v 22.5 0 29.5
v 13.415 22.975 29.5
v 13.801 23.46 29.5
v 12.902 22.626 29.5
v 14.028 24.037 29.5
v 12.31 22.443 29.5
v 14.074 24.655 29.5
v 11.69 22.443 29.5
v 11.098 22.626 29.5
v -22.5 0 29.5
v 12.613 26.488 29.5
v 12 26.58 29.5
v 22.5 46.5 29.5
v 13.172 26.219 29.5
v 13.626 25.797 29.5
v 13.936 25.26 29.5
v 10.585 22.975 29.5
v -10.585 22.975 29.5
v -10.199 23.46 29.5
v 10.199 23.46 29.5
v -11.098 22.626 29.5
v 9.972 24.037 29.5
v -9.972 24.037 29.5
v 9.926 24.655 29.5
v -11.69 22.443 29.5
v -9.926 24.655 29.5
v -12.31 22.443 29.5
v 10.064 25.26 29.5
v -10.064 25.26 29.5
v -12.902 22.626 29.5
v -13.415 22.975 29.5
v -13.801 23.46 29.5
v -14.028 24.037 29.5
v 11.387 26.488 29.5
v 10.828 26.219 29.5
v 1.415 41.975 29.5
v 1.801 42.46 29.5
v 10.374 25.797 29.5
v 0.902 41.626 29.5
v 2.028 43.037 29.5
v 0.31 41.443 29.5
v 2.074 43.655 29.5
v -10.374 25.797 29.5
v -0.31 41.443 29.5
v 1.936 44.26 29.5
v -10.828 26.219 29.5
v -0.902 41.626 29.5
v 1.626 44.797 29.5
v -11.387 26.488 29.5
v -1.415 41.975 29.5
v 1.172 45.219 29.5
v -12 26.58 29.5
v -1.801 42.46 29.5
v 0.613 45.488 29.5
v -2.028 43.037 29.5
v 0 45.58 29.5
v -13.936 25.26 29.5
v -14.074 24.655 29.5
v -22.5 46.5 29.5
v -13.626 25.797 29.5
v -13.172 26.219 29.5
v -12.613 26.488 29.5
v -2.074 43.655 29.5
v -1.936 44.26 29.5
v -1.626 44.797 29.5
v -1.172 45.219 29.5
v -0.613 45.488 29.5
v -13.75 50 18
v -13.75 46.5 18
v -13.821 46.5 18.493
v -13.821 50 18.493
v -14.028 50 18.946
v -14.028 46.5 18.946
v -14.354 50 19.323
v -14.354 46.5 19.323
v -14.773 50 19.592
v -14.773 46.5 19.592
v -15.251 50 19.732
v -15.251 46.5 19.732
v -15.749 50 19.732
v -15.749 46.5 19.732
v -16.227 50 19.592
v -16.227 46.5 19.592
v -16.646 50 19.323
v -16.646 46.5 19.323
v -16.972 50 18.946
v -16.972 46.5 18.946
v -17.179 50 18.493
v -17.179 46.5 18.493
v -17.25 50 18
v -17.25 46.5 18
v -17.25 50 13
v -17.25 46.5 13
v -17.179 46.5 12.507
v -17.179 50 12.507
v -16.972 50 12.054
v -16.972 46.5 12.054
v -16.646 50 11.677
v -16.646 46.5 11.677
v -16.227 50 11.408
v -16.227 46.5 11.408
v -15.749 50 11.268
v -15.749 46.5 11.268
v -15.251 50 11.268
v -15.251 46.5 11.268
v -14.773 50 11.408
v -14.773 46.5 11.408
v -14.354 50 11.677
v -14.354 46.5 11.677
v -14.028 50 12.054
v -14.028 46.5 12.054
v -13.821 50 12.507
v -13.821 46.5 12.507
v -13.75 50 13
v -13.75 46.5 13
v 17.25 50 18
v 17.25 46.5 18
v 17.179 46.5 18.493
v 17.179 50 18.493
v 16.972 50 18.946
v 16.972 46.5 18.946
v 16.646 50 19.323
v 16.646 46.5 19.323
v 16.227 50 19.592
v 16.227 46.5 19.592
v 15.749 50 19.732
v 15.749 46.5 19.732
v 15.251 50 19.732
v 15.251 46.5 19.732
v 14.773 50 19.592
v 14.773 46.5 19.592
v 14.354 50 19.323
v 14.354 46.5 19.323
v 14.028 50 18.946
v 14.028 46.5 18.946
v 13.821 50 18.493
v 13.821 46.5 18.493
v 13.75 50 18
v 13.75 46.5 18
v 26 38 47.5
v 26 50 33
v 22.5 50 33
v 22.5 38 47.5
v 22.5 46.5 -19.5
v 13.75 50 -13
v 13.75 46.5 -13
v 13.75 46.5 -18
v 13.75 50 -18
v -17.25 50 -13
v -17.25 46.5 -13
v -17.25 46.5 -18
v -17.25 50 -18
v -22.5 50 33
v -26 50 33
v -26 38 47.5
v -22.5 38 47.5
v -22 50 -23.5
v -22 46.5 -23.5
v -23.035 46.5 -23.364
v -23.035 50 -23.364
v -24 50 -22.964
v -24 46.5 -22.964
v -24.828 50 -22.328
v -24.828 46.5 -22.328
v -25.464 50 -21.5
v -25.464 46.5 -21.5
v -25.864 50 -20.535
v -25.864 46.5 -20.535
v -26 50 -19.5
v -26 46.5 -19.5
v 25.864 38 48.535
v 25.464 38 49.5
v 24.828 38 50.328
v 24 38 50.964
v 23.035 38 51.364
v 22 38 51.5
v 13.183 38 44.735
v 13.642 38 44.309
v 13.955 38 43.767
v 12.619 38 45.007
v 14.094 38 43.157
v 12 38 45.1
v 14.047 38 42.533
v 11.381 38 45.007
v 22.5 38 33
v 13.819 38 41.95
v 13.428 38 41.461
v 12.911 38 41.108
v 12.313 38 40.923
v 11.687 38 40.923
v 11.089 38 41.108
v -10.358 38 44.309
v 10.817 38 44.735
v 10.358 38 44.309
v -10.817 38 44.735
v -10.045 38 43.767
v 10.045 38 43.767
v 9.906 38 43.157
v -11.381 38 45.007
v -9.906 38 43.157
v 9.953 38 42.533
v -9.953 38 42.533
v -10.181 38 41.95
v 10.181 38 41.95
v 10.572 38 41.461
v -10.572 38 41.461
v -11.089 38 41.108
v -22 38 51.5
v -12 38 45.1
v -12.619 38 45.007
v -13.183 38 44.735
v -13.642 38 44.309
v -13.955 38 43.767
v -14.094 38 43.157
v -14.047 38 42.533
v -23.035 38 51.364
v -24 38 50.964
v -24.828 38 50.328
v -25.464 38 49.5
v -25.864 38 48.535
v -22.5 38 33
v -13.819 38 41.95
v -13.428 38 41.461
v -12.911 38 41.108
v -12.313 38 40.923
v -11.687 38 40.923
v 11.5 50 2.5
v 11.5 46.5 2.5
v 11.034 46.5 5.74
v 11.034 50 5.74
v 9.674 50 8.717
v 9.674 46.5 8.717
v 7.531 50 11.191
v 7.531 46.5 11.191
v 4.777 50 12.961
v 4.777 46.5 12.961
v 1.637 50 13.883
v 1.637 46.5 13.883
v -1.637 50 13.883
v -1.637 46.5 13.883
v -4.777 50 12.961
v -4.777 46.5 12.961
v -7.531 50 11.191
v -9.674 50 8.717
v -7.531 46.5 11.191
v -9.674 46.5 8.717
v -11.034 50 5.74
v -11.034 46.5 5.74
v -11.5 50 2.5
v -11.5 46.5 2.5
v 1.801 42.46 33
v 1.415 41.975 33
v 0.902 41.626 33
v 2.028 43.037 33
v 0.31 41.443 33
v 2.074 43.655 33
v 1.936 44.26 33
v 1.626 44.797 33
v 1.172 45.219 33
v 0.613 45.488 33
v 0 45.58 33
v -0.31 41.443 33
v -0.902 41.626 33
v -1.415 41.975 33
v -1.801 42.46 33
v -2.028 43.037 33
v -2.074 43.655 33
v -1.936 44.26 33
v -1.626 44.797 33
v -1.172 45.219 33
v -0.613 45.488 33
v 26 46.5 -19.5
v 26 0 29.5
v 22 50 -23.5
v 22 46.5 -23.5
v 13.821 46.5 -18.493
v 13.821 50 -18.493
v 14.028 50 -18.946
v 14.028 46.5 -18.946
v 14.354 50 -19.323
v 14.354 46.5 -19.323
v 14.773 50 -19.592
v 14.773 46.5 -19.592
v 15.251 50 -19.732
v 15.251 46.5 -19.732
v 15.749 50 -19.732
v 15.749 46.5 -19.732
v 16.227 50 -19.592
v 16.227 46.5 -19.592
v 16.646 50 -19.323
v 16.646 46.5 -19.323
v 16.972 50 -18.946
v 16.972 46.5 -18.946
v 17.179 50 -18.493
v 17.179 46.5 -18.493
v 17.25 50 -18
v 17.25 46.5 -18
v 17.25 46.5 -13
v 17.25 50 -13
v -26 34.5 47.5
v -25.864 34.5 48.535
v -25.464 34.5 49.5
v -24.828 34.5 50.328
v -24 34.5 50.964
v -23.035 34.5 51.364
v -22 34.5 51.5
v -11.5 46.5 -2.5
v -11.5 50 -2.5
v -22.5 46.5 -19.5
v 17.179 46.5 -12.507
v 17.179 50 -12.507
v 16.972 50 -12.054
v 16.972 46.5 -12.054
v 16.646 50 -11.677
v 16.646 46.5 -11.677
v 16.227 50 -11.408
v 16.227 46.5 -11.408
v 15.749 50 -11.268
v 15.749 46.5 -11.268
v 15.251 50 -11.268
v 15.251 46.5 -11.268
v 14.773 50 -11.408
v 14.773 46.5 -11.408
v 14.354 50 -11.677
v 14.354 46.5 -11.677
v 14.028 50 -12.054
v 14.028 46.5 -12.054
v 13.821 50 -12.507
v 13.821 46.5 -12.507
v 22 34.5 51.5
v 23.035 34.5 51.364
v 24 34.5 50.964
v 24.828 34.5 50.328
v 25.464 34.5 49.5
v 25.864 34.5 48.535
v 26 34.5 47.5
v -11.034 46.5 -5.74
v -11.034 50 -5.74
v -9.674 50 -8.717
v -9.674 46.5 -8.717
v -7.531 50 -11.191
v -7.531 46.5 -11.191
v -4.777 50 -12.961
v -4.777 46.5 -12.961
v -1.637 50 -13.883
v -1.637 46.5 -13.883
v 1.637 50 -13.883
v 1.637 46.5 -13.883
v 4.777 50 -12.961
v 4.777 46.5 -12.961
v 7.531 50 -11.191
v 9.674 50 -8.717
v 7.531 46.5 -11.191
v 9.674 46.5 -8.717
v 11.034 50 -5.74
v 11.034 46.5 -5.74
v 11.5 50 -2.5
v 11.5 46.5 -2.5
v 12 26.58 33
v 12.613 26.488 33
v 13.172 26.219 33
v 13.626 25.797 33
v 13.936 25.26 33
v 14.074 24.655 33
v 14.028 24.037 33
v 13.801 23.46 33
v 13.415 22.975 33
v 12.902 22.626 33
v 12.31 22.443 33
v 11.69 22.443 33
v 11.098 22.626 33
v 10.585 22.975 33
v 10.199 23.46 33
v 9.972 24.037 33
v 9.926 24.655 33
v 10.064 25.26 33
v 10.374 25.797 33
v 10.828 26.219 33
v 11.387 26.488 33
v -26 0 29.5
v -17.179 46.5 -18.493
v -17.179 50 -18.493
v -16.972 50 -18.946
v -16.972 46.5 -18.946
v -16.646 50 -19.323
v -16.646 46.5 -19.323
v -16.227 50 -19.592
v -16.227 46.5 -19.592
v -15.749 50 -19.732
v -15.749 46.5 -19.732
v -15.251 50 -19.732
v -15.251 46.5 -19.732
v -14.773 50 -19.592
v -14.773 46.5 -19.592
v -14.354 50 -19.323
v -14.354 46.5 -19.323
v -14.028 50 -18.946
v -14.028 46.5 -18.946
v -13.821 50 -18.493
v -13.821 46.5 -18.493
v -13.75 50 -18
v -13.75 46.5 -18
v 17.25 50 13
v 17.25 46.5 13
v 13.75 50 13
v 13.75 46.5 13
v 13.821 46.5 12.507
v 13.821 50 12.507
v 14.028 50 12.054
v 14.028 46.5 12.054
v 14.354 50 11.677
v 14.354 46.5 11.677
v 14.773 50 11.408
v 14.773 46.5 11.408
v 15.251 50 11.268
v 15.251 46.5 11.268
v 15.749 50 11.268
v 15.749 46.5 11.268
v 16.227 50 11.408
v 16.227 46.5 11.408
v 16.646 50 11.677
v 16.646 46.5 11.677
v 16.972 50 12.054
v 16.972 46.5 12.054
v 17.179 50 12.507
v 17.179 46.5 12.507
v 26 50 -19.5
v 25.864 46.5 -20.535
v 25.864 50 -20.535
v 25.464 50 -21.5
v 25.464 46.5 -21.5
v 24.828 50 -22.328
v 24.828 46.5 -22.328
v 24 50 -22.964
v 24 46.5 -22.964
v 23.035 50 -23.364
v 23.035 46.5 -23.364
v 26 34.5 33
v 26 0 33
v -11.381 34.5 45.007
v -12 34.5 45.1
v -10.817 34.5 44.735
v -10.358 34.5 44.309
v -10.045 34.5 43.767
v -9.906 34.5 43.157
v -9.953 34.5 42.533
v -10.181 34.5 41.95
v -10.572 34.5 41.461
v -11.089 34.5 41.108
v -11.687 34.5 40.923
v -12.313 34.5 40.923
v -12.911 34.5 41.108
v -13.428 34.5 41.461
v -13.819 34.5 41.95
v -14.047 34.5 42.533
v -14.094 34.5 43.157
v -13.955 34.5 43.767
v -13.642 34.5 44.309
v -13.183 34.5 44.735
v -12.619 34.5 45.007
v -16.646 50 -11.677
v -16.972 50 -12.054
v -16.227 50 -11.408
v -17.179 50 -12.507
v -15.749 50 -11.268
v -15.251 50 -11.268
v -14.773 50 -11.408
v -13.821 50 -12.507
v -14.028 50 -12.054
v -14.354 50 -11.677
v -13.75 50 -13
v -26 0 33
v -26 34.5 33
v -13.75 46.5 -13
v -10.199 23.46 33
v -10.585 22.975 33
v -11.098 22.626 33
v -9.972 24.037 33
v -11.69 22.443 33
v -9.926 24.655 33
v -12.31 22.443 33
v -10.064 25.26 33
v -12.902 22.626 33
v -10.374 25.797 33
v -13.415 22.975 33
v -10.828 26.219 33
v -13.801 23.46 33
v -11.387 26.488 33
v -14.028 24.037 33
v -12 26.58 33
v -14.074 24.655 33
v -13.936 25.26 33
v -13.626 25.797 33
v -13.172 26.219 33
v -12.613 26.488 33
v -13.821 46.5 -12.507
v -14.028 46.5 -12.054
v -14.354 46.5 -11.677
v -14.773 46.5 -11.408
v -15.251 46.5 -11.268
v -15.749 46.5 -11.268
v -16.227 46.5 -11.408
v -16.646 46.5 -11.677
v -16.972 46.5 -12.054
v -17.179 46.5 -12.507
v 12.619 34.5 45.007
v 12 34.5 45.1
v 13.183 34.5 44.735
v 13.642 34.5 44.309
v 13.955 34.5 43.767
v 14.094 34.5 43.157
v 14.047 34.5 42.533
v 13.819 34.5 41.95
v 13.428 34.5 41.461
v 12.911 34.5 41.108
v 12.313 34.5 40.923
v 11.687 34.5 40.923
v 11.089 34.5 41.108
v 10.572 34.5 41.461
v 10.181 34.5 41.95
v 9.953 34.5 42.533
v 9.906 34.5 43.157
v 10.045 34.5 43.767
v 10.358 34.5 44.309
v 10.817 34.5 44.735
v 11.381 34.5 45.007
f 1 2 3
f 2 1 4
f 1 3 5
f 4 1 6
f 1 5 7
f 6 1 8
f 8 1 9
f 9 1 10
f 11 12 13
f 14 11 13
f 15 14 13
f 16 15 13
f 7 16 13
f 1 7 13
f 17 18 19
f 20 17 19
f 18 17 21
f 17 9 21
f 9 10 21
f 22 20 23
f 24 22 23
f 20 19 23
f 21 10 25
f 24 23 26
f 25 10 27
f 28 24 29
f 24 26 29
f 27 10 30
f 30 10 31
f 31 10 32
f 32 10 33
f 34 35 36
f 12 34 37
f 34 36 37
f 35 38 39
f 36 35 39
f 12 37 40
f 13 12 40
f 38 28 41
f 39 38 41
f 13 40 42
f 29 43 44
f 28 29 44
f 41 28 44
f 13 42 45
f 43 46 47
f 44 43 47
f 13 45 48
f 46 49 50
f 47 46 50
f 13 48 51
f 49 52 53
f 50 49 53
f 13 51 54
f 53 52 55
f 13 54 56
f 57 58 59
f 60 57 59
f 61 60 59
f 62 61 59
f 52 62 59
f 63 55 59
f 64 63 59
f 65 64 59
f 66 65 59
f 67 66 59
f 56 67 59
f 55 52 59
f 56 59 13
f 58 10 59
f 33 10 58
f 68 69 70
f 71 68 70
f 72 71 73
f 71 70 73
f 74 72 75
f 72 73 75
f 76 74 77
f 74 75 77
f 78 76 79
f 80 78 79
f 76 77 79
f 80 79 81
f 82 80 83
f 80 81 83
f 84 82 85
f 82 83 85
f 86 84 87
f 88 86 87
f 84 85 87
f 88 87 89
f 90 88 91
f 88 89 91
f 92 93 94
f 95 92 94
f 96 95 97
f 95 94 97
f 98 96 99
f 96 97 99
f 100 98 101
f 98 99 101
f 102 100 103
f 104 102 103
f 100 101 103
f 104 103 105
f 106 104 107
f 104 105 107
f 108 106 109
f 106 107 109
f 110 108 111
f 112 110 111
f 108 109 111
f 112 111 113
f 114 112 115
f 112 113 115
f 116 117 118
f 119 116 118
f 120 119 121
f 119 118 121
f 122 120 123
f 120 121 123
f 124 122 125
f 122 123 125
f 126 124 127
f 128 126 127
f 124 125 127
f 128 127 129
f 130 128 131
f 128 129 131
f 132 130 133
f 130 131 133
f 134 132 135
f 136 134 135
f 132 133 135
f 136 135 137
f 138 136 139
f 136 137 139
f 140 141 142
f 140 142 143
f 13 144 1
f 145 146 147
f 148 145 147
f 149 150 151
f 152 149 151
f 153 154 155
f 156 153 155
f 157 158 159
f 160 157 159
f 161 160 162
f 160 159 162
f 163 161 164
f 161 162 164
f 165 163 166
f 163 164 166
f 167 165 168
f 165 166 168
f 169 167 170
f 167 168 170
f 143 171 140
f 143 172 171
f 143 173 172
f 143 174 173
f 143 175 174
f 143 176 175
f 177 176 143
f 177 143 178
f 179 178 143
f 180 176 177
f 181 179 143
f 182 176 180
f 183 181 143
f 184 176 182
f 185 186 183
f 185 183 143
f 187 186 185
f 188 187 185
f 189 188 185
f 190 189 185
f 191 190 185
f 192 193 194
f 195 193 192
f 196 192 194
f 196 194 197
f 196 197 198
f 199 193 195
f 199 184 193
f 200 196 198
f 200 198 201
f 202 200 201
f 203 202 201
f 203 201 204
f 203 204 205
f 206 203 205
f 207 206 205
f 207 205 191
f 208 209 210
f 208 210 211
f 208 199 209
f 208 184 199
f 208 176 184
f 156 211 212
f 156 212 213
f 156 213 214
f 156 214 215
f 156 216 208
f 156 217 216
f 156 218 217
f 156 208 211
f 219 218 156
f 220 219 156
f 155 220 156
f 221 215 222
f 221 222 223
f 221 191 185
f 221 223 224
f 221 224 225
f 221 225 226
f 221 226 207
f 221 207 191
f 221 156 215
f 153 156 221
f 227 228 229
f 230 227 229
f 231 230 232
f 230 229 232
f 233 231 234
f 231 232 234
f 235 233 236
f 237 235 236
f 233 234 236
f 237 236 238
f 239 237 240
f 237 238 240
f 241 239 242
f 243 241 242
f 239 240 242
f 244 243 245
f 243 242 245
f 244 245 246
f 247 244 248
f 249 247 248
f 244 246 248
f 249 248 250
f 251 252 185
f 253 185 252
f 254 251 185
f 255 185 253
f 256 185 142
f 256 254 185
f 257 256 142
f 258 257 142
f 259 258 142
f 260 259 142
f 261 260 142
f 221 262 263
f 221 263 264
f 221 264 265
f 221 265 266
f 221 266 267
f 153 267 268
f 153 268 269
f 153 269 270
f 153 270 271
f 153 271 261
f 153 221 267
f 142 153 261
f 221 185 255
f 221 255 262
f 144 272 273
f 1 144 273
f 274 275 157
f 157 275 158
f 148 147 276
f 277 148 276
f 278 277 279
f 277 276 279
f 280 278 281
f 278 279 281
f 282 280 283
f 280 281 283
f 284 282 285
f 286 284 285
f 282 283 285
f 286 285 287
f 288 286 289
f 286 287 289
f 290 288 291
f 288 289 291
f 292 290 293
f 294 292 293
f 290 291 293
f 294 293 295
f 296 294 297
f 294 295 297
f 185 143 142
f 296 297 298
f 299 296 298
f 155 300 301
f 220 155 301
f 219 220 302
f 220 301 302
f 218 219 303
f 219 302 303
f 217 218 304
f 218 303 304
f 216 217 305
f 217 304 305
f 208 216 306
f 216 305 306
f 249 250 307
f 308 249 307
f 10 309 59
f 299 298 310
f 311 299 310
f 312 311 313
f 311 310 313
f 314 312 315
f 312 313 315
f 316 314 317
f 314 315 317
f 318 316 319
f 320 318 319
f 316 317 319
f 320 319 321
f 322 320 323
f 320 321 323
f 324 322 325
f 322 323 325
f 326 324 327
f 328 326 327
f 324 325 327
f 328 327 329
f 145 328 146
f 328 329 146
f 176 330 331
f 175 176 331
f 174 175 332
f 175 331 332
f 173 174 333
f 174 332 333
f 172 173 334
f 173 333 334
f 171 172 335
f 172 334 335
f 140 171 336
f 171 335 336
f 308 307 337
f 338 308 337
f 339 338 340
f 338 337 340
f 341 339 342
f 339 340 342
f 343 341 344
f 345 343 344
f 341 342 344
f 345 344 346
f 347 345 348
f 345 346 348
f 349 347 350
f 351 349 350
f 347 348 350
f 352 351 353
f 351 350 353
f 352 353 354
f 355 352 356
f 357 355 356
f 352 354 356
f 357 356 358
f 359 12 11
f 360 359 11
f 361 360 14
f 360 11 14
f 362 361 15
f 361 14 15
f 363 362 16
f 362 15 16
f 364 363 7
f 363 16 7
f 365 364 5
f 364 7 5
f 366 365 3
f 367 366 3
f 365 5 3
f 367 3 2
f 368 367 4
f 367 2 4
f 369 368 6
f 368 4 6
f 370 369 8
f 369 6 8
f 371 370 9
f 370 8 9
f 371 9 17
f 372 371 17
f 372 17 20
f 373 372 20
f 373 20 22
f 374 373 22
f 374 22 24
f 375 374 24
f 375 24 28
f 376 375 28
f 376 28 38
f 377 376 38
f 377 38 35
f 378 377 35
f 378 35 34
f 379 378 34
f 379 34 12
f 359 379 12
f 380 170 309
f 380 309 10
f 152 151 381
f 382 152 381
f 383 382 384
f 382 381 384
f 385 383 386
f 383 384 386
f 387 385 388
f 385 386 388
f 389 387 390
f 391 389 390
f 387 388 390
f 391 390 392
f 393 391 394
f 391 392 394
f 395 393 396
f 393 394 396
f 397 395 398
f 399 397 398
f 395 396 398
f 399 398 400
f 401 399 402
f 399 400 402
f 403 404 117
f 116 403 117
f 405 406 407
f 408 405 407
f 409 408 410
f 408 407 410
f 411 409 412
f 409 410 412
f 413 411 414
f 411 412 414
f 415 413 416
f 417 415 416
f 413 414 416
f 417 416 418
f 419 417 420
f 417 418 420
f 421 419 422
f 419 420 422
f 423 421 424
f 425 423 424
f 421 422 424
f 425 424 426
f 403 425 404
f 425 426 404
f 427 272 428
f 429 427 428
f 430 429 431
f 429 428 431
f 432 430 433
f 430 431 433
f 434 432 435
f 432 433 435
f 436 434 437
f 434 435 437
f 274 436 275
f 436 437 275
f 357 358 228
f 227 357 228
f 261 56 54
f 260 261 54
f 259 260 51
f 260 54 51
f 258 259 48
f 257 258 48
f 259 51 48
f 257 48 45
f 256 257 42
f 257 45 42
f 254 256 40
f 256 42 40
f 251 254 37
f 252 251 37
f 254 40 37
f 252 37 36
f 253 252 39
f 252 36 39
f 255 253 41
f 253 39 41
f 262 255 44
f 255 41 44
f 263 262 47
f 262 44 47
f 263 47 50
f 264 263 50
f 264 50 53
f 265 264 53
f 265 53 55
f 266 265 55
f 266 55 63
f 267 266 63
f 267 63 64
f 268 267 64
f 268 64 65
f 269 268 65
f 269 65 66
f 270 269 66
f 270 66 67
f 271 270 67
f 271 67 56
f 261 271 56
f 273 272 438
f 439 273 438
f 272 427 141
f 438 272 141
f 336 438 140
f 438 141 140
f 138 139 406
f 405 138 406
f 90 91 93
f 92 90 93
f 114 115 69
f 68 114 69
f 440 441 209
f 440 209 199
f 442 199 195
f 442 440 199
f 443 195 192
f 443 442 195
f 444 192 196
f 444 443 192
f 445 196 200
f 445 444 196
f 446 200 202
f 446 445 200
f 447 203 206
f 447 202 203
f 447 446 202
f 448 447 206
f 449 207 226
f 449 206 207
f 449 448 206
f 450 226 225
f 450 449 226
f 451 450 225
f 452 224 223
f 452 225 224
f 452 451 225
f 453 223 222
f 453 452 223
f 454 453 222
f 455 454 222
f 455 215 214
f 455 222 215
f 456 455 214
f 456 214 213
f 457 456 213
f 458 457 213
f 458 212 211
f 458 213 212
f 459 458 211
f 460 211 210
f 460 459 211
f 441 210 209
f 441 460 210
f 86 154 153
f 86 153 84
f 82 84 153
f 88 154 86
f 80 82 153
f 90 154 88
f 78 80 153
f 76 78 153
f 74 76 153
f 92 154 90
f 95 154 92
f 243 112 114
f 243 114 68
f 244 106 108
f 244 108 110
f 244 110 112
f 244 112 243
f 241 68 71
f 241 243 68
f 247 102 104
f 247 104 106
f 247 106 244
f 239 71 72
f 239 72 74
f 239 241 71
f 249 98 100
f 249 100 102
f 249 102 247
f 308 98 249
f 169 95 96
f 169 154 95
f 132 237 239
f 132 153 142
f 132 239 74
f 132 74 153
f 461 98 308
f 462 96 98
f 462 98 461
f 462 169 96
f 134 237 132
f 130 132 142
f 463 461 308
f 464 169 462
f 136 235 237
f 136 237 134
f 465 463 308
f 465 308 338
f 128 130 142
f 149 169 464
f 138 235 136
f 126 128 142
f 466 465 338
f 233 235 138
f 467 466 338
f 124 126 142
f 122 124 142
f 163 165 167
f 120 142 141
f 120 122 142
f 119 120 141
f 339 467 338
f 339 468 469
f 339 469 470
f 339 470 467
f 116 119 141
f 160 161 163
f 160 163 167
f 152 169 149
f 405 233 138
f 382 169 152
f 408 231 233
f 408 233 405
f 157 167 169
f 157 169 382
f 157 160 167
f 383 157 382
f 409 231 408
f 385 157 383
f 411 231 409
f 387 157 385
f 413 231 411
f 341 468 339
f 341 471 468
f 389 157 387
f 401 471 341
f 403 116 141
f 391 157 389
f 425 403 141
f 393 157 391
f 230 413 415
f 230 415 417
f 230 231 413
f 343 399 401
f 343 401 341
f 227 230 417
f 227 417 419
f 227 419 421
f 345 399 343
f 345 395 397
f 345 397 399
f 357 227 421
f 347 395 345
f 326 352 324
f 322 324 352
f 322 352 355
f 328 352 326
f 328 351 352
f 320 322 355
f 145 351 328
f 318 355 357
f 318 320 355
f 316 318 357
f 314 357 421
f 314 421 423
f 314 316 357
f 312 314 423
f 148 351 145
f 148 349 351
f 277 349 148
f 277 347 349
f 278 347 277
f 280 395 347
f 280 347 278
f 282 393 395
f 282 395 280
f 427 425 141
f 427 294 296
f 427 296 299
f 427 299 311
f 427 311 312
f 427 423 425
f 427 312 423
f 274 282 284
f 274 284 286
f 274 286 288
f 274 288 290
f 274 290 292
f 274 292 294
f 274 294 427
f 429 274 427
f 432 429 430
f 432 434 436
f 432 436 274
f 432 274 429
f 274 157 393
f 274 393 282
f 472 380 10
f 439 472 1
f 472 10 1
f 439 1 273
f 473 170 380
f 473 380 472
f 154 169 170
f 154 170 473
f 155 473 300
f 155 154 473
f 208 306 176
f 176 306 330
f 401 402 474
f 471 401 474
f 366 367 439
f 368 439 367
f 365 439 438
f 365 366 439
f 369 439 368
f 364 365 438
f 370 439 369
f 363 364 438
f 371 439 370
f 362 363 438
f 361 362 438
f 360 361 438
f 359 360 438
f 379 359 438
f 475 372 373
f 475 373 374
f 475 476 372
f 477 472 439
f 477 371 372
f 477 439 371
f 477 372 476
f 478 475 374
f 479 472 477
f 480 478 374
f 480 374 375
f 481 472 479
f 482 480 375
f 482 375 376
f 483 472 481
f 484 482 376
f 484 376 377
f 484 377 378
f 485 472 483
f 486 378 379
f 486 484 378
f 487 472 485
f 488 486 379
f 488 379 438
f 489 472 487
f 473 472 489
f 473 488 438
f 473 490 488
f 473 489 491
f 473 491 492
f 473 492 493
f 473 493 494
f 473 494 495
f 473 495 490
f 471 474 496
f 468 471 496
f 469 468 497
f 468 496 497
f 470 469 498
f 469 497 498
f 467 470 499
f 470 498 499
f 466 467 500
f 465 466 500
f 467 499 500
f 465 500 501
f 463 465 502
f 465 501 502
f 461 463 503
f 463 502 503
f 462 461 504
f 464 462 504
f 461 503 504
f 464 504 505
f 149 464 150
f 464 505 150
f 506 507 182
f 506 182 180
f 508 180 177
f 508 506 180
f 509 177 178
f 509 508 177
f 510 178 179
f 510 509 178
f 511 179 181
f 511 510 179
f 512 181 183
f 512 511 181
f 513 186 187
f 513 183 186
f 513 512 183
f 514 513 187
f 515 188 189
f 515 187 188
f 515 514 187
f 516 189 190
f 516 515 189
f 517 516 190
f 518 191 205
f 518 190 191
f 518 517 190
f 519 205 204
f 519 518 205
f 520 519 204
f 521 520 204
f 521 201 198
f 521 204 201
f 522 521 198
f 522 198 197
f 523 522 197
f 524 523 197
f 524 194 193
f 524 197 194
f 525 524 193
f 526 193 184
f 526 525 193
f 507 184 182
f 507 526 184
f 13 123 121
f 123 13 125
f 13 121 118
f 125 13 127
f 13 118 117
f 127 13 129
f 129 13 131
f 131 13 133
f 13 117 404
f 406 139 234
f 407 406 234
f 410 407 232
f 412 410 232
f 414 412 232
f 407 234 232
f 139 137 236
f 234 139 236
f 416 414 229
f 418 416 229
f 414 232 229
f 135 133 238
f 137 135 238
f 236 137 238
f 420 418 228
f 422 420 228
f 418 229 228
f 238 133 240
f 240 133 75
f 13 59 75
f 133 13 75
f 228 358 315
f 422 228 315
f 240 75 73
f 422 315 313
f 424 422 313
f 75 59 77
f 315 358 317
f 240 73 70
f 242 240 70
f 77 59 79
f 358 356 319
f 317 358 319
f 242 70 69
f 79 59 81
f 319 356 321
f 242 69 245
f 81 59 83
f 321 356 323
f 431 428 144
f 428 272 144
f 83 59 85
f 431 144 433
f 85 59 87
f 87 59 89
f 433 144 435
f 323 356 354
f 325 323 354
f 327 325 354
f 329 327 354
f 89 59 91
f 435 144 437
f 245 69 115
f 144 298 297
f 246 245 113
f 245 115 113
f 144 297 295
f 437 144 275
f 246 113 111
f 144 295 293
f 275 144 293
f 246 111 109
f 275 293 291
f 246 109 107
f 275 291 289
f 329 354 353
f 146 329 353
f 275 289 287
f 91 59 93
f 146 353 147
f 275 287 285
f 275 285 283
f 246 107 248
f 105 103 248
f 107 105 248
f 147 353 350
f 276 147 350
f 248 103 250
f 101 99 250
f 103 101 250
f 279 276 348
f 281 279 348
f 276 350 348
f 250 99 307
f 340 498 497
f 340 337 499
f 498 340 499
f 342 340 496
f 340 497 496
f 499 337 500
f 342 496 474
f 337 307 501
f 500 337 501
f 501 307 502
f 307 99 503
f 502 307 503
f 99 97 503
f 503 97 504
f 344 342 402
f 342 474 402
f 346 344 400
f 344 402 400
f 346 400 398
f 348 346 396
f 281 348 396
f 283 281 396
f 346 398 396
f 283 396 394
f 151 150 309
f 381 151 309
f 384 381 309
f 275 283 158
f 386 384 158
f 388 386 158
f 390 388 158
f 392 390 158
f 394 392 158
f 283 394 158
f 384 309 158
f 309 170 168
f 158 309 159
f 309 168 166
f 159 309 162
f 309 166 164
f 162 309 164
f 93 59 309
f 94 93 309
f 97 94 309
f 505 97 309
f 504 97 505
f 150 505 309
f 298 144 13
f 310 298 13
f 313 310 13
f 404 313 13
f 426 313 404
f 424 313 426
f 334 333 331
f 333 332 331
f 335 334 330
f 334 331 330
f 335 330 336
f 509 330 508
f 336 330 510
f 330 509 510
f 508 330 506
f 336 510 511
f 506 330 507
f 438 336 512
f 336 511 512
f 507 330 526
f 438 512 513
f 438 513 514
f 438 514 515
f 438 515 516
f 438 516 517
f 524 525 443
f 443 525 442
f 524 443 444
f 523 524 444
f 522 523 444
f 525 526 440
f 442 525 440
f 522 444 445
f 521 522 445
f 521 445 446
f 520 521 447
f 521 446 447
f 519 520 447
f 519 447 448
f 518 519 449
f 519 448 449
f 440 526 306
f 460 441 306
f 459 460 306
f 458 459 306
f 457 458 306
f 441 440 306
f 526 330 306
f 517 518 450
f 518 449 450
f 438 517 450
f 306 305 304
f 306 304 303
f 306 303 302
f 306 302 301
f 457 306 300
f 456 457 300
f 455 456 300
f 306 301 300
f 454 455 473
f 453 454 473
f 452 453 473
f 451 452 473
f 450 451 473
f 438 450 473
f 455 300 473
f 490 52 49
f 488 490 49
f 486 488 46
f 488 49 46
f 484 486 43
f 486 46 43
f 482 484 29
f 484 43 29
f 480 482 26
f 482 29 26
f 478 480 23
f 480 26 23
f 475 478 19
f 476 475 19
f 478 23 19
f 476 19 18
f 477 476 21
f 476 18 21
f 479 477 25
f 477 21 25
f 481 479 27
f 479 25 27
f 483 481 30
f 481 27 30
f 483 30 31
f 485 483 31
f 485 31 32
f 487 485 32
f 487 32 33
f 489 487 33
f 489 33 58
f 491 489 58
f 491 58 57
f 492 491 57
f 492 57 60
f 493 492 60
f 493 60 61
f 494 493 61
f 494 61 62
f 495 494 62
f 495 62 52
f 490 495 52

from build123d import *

# Parameters (mm, degrees)
SKETCH1_R               = 2.1
BOSS_EXTRUDE1_DEPTH     = 50
CUT_EXTRUDE1_DEPTH      = 77.342976101
CUT_EXTRUDE1_DEPTH_BACK = 77.342976101
SKETCH2_W               = 18.5
SKETCH2_H               = 12
SKETCH2_W_2             = 53
SKETCH2_H_2             = 46.5
SKETCH2_H_3             = 34.5
BOSS_EXTRUDE2_DEPTH     = 3.5
SKETCH4_R               = 2.08
CUT_EXTRUDE2_DEPTH      = 78.362781749


with BuildPart() as part:
    # Sketch1 → Boss-Extrude1 (new body)
    with BuildSketch(Plane(origin=(0, 0, 0), x_dir=(1, 0, 0), z_dir=(0, 1, 0))):
        with BuildLine():
            Line((22, 23.5), (-22, 23.5))
            ThreePointArc((-22, 23.5), (-24.828427125, 22.328427125), (-26, 19.5))
            Line((-26, 19.5), (-26, -47.5))
            ThreePointArc((-26, -47.5), (-24.828427125, -50.328427125), (-22, -51.5))
            Line((-22, -51.5), (22, -51.5))
            ThreePointArc((22, -51.5), (24.828427125, -50.328427125), (26, -47.5))
            Line((26, -47.5), (26, 19.5))
            ThreePointArc((26, 19.5), (24.828427125, 22.328427125), (22, 23.5))
        make_face()
        with Locations((-12, -43)):
            Circle(SKETCH1_R, mode=Mode.SUBTRACT)
        with Locations((12, -43)):
            Circle(SKETCH1_R, mode=Mode.SUBTRACT)
        with BuildLine():
            Line((11.5, 2.5), (11.5, -2.5))
            ThreePointArc((11.5, -2.5), (0, -14), (-11.5, -2.5))
            Line((-11.5, -2.5), (-11.5, 2.5))
            ThreePointArc((-11.5, 2.5), (0, 14), (11.5, 2.5))
        make_face(mode=Mode.SUBTRACT)
        with BuildLine():
            Line((-13.75, 18), (-13.75, 13))
            ThreePointArc((-13.75, 13), (-15.5, 11.25), (-17.25, 13))
            Line((-17.25, 13), (-17.25, 18))
            ThreePointArc((-17.25, 18), (-15.5, 19.75), (-13.75, 18))
        make_face(mode=Mode.SUBTRACT)
        with BuildLine():
            Line((17.25, 18), (17.25, 13))
            ThreePointArc((17.25, 13), (15.5, 11.25), (13.75, 13))
            Line((13.75, 13), (13.75, 18))
            ThreePointArc((13.75, 18), (15.5, 19.75), (17.25, 18))
        make_face(mode=Mode.SUBTRACT)
        with BuildLine():
            Line((17.25, -13), (17.25, -18))
            ThreePointArc((17.25, -18), (15.5, -19.75), (13.75, -18))
            Line((13.75, -18), (13.75, -13))
            ThreePointArc((13.75, -13), (15.5, -11.25), (17.25, -13))
        make_face(mode=Mode.SUBTRACT)
        with BuildLine():
            Line((-13.75, -13), (-13.75, -18))
            ThreePointArc((-13.75, -18), (-15.5, -19.75), (-17.25, -18))
            Line((-17.25, -18), (-17.25, -13))
            ThreePointArc((-17.25, -13), (-15.5, -11.25), (-13.75, -13))
        make_face(mode=Mode.SUBTRACT)
    extrude(amount=BOSS_EXTRUDE1_DEPTH)

    # Sketch2 → Cut-Extrude1 (cut, two sides: drawn at the far end of the back side and taken through both)
    with BuildSketch(Plane(origin=(0, 0, 0), x_dir=(0, 0, -1), z_dir=(1, 0, 0)).offset(-CUT_EXTRUDE1_DEPTH_BACK)):
        with Locations((-42.25, 44)):
            Rectangle(SKETCH2_W, SKETCH2_H)
        with Locations((-3, 23.25)):
            Rectangle(SKETCH2_W_2, SKETCH2_H_2)
        with Locations((-42.25, 17.25)):
            Rectangle(SKETCH2_W, SKETCH2_H_3)
    extrude(amount=CUT_EXTRUDE1_DEPTH + CUT_EXTRUDE1_DEPTH_BACK, mode=Mode.SUBTRACT)

    # Sketch3 → Boss-Extrude2 (add)
    with BuildSketch(Plane(origin=(26, 0, 0), x_dir=(0, 0, -1), z_dir=(1, 0, 0))):
        Polygon((19.5, 46.5), (-29.5, 0), (-29.5, 46.5), align=None)
        Polygon((-33, 50), (-47.5, 38), (-33, 38), align=None)
    boss_extrude2 = extrude(amount=-BOSS_EXTRUDE2_DEPTH)

    # Mirror1: Boss-Extrude2 across plane
    add(boss_extrude2.mirror(Plane(origin=(0, 0, 0), x_dir=(0, 0, 1), z_dir=(1, 0, 0))))

    # Sketch4 → Cut-Extrude2 (cut, through all)
    with BuildSketch(Plane(origin=(0, 0, 29.5), x_dir=(-1, 0, 0), z_dir=(0, 0, -1))):
        with Locations((-12, 24.5)):
            Circle(SKETCH4_R)
        with Locations((12, 24.5)):
            Circle(SKETCH4_R)
        with Locations((0, 43.5)):
            Circle(SKETCH4_R)
    extrude(amount=-CUT_EXTRUDE2_DEPTH, mode=Mode.SUBTRACT)


solid = part.part
